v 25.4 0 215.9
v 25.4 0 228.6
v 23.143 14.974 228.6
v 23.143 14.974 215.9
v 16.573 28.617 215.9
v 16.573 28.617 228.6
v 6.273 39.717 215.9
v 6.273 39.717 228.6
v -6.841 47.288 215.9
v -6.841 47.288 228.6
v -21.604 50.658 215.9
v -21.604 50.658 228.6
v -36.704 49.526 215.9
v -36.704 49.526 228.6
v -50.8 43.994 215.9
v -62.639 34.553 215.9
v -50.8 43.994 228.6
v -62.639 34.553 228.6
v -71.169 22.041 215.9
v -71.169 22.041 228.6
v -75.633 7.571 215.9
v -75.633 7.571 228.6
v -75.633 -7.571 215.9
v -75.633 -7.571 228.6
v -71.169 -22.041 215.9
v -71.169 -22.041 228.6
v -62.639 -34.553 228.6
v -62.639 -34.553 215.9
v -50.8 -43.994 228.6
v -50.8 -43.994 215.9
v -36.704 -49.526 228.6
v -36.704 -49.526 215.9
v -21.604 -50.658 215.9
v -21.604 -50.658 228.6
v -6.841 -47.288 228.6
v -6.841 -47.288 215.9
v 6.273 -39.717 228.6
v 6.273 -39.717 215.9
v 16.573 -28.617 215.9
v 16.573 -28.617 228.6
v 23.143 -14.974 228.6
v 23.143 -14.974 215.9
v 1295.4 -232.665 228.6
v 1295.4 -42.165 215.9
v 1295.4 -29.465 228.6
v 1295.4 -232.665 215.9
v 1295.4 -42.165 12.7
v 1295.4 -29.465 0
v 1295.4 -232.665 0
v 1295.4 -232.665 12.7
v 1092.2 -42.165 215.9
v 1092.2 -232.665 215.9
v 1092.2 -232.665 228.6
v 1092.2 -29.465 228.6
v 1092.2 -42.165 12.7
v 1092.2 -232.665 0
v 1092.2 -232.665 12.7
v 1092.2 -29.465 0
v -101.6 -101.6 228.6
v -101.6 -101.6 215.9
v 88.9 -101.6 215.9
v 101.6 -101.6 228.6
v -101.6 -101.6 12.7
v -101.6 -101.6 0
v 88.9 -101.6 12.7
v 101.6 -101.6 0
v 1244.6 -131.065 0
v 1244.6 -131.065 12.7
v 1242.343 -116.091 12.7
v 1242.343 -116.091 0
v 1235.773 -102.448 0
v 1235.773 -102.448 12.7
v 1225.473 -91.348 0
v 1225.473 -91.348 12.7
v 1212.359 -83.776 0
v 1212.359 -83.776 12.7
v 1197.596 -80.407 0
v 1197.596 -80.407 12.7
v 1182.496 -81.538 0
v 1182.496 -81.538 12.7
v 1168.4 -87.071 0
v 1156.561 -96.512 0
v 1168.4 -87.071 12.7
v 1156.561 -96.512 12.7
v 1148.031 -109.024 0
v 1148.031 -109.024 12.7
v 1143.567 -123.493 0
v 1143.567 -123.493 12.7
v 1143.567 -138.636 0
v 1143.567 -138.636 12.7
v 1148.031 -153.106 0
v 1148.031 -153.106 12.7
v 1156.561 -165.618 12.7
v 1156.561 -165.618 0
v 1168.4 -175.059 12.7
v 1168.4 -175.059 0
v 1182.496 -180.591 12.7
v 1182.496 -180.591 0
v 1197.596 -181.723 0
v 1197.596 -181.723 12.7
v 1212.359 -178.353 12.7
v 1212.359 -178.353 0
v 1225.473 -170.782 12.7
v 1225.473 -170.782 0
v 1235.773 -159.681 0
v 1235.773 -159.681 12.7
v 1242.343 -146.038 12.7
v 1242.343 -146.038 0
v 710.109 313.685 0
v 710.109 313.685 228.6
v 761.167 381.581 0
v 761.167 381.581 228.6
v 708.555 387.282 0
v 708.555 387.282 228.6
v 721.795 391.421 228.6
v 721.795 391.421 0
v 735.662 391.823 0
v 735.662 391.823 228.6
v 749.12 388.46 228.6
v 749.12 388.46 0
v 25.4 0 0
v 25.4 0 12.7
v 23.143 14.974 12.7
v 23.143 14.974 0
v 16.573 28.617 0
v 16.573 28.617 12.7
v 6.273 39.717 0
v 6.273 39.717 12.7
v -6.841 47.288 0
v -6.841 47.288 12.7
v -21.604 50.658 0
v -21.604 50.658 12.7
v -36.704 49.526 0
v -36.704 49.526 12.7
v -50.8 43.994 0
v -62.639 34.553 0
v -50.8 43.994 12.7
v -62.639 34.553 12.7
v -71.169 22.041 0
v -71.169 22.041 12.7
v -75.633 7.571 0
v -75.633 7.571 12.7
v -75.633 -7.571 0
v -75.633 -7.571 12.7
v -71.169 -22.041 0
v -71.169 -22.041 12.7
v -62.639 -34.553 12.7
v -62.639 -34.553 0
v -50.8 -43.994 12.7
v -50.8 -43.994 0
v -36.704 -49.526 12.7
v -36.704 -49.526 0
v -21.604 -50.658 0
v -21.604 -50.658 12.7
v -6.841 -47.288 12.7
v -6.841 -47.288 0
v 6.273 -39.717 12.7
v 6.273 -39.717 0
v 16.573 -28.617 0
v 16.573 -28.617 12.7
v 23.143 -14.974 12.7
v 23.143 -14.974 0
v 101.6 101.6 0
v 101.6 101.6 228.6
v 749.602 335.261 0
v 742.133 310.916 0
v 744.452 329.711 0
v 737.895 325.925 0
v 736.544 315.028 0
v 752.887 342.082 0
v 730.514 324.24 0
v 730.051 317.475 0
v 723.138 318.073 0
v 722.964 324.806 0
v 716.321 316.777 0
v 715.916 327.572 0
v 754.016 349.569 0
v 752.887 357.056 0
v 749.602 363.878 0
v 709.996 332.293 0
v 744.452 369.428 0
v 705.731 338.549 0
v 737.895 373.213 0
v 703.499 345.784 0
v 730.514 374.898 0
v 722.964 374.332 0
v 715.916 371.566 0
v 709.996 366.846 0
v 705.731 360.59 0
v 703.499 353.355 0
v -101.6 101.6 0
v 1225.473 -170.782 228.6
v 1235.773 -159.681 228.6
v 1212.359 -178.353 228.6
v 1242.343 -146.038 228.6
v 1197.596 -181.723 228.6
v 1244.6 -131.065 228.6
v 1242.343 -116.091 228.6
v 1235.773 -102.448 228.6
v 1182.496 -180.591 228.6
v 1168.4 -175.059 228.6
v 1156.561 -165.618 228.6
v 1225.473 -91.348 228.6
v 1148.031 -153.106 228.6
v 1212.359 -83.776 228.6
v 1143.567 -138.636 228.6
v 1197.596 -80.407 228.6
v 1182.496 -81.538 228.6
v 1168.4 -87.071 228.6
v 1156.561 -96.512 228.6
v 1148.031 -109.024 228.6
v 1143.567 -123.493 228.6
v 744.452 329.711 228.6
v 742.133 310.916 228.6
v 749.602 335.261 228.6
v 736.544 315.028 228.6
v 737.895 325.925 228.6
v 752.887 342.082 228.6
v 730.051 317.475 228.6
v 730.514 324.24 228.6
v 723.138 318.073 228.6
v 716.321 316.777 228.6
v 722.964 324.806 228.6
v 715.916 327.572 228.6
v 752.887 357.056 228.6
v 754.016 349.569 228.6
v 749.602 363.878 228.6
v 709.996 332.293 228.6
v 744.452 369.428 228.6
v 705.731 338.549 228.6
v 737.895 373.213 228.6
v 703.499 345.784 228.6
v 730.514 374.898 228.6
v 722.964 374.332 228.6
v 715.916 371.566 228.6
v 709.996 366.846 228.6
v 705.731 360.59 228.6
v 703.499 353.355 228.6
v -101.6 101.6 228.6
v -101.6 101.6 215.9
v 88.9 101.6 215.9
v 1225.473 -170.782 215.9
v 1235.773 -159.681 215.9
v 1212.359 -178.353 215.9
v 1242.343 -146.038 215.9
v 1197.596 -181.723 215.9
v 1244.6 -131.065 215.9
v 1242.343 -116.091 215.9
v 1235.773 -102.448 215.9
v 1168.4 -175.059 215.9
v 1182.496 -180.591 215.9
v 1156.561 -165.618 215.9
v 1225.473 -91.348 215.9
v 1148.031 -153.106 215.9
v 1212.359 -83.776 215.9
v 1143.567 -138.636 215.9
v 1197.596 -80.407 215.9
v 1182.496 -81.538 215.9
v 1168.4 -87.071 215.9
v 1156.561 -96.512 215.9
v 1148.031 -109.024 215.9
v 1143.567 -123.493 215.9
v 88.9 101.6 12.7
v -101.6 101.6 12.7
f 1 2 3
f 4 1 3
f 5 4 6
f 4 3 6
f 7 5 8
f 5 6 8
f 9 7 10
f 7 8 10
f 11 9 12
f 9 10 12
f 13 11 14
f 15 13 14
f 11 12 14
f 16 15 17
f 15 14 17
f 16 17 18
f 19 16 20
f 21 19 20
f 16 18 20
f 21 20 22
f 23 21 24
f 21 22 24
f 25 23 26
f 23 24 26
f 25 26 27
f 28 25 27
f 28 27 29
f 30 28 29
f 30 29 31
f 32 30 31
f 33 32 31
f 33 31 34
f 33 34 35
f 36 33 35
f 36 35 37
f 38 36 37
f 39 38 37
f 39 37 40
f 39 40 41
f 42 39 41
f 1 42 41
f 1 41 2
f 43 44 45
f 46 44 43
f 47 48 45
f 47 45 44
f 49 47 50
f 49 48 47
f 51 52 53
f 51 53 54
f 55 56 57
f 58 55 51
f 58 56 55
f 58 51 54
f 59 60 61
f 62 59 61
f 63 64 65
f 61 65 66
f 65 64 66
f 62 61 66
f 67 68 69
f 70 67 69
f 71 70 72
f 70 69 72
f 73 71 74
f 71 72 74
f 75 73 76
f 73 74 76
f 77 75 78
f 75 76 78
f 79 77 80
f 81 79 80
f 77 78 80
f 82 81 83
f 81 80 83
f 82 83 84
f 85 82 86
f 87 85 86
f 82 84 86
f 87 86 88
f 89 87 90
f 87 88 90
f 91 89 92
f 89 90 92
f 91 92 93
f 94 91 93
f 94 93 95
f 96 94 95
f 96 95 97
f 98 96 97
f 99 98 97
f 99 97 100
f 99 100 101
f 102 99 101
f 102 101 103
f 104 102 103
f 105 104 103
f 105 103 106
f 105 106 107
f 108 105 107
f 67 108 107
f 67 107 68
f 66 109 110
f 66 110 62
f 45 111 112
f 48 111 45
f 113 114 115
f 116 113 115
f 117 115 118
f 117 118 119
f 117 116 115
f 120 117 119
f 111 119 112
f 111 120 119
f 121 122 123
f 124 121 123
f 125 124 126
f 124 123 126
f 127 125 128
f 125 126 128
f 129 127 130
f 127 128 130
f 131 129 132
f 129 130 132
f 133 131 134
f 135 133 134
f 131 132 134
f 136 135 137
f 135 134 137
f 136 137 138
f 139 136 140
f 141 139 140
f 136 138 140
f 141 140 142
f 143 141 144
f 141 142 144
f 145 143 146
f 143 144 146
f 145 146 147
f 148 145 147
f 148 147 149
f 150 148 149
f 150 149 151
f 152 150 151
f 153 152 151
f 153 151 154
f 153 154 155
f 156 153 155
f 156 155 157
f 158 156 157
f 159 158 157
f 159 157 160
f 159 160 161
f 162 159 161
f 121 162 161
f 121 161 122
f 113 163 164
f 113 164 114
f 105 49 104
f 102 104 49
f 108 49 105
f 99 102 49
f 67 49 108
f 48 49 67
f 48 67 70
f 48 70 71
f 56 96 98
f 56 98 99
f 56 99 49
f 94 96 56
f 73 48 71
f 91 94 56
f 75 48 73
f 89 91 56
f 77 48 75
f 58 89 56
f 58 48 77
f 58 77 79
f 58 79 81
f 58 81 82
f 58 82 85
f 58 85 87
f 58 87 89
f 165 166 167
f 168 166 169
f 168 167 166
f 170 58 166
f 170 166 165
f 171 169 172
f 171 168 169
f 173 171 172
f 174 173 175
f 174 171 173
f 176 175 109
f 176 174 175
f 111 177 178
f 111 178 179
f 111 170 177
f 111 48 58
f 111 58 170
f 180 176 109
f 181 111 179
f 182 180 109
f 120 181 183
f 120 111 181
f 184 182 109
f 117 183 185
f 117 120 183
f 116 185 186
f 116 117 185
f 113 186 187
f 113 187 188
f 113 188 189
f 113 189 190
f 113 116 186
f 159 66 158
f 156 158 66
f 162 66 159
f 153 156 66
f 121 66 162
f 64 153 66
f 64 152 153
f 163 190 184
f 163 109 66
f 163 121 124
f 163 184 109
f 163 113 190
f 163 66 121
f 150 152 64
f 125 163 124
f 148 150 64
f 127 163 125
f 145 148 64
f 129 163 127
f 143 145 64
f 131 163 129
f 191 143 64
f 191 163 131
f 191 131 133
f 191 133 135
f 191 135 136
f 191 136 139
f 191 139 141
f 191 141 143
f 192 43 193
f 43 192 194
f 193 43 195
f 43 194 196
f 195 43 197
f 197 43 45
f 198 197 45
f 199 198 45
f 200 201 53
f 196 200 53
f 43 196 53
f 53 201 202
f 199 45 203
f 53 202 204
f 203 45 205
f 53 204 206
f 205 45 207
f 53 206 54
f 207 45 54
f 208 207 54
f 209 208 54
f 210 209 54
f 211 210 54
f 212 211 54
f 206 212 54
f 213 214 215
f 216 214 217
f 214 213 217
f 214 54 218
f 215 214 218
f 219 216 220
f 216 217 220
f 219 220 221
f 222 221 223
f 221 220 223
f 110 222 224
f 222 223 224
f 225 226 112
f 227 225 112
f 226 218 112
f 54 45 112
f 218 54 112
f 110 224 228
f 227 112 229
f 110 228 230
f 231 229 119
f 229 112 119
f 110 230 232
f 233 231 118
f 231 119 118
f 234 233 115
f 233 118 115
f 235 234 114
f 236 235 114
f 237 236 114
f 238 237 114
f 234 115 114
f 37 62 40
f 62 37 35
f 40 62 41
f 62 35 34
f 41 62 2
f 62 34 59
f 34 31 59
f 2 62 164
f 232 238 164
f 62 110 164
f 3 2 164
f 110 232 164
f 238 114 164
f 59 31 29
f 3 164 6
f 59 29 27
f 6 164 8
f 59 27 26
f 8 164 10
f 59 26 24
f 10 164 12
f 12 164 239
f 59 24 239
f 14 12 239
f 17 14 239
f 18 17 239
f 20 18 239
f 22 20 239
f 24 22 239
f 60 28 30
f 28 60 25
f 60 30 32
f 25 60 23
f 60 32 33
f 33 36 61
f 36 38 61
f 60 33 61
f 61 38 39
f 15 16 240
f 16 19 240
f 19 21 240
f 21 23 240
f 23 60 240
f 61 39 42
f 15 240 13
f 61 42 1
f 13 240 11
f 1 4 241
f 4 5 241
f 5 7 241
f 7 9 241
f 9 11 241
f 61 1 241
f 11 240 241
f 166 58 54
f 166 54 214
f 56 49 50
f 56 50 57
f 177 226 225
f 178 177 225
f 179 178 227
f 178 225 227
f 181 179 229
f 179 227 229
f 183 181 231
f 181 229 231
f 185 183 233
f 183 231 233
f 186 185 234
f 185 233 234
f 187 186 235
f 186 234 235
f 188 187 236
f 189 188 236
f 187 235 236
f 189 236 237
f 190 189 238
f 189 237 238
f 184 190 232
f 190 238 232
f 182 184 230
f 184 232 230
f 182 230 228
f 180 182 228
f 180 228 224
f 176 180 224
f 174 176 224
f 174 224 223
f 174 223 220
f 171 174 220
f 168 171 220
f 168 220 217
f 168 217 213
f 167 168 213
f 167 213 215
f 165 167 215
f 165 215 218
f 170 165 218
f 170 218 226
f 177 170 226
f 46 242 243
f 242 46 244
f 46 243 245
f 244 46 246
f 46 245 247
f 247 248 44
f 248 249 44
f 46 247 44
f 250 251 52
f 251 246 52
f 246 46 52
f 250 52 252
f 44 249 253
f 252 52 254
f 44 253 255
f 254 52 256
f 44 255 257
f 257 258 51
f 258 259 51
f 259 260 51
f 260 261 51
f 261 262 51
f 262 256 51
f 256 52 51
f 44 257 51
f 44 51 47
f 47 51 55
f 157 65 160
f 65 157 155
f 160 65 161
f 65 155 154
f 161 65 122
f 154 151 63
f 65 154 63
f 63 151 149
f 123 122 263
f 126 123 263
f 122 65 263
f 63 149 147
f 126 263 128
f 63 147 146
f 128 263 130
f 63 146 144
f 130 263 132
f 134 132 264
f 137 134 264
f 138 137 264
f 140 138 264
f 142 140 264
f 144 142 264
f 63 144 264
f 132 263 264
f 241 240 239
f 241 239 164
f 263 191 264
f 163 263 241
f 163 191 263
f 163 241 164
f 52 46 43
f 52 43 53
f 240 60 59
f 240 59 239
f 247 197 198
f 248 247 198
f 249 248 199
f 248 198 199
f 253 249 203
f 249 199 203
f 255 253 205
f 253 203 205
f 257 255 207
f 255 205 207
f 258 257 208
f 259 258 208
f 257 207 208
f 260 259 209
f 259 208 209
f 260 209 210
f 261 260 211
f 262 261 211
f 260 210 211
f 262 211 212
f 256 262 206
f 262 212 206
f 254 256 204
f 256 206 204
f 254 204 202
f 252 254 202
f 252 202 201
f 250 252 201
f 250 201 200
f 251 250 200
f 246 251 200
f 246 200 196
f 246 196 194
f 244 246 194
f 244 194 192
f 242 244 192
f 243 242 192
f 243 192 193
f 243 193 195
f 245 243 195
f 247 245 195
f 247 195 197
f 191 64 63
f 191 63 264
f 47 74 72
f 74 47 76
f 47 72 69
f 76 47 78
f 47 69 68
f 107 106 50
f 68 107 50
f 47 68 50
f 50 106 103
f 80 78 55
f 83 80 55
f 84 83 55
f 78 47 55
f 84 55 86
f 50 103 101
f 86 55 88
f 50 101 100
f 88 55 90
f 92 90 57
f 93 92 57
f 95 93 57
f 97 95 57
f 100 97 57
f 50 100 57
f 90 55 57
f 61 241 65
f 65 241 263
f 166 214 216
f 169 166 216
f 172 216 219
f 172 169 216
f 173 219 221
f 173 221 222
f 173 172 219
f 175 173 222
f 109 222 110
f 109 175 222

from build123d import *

# Parameters (mm, degrees)
SKETCH1_W           = 203.2
SKETCH1_H           = 203.2
BOSS_EXTRUDE1_DEPTH = 228.6
CUT_EXTRUDE1_DEPTH  = 228.6
SKETCH3_R           = 50.8
CUT_EXTRUDE2_DEPTH  = 271.005703643
BOSS_EXTRUDE2_DEPTH = 228.6
CUT_EXTRUDE3_DEPTH  = 1278.174091308
SKETCH7_R           = 50.8
CUT_EXTRUDE4_DEPTH  = 1373.616617817
SKETCH8_R           = 25.4
CUT_EXTRUDE5_DEPTH  = 1373.616617817


with BuildPart() as part:
    # Sketch1 → Boss-Extrude1 (new body)
    with BuildSketch(Plane.XY):
        Rectangle(SKETCH1_W, SKETCH1_H)
    extrude(amount=BOSS_EXTRUDE1_DEPTH)

    # Sketch2 → Cut-Extrude1 (cut)
    with BuildSketch(Plane(origin=(0, 101.6, 0), x_dir=(1, 0, 0), z_dir=(0, 1, 0))):
        Polygon((-88.9, -12.7), (-131.920098672, -12.7), (-131.920098672, -215.9), (-88.9, -215.9), (88.9, -215.9), (88.9, -12.7), align=None)
    extrude(amount=-CUT_EXTRUDE1_DEPTH, mode=Mode.SUBTRACT)

    # Sketch3 → Cut-Extrude2 (cut, through all)
    with BuildSketch(Plane.XY.offset(228.6)):
        with Locations((-25.4, 0)):
            Circle(SKETCH3_R)
    extrude(amount=-CUT_EXTRUDE2_DEPTH, mode=Mode.SUBTRACT)

    # Sketch5 → Boss-Extrude2 (add)
    with BuildSketch(Plane.XY):
        with BuildLine():
            Line((101.6, 101.6), (708.554663443, 387.282081105))
            ThreePointArc((708.554663443, 387.282081105), (735.661628292, 391.823256752), (761.166531666, 381.580711976))
            Line((761.166531666, 381.580711976), (1295.4, -29.464807141))
            Line((1295.4, -29.464807141), (1295.4, -232.664807141))
            Line((1295.4, -232.664807141), (1092.2, -232.664807141))
            Line((1092.2, -232.664807141), (1092.2, -29.464807141))
            Line((1092.2, -29.464807141), (742.133450583, 310.915917798))
            ThreePointArc((742.133450583, 310.915917798), (726.614813955, 318.010811429), (710.108636303, 313.685109437))
            Line((710.108636303, 313.685109437), (101.6, -101.6))
            Line((101.6, -101.6), (101.6, 101.6))
        make_face()
    extrude(amount=BOSS_EXTRUDE2_DEPTH)

    # Sketch6 → Cut-Extrude3 (cut, through all)
    with BuildSketch(Plane.ZY.offset(-1092.2)):
        Polygon((12.7, -219.964807141), (12.7, -266.729426715), (215.9, -266.729426715), (215.9, -219.964807141), (215.9, -42.164807141), (12.7, -42.164807141), align=None)
    extrude(amount=-CUT_EXTRUDE3_DEPTH, mode=Mode.SUBTRACT)

    # Sketch7 → Cut-Extrude4 (cut, through all)
    with BuildSketch(Plane.XY.offset(228.6)):
        with Locations((1193.8, -131.064807141)):
            Circle(SKETCH7_R)
    extrude(amount=-CUT_EXTRUDE4_DEPTH, mode=Mode.SUBTRACT)

    # Sketch8 → Cut-Extrude5 (cut, through all)
    with BuildSketch(Plane.XY.offset(228.6)):
        with Locations((728.615646145, 349.569241459)):
            Circle(SKETCH8_R)
    extrude(amount=-CUT_EXTRUDE5_DEPTH, mode=Mode.SUBTRACT)


solid = part.part
